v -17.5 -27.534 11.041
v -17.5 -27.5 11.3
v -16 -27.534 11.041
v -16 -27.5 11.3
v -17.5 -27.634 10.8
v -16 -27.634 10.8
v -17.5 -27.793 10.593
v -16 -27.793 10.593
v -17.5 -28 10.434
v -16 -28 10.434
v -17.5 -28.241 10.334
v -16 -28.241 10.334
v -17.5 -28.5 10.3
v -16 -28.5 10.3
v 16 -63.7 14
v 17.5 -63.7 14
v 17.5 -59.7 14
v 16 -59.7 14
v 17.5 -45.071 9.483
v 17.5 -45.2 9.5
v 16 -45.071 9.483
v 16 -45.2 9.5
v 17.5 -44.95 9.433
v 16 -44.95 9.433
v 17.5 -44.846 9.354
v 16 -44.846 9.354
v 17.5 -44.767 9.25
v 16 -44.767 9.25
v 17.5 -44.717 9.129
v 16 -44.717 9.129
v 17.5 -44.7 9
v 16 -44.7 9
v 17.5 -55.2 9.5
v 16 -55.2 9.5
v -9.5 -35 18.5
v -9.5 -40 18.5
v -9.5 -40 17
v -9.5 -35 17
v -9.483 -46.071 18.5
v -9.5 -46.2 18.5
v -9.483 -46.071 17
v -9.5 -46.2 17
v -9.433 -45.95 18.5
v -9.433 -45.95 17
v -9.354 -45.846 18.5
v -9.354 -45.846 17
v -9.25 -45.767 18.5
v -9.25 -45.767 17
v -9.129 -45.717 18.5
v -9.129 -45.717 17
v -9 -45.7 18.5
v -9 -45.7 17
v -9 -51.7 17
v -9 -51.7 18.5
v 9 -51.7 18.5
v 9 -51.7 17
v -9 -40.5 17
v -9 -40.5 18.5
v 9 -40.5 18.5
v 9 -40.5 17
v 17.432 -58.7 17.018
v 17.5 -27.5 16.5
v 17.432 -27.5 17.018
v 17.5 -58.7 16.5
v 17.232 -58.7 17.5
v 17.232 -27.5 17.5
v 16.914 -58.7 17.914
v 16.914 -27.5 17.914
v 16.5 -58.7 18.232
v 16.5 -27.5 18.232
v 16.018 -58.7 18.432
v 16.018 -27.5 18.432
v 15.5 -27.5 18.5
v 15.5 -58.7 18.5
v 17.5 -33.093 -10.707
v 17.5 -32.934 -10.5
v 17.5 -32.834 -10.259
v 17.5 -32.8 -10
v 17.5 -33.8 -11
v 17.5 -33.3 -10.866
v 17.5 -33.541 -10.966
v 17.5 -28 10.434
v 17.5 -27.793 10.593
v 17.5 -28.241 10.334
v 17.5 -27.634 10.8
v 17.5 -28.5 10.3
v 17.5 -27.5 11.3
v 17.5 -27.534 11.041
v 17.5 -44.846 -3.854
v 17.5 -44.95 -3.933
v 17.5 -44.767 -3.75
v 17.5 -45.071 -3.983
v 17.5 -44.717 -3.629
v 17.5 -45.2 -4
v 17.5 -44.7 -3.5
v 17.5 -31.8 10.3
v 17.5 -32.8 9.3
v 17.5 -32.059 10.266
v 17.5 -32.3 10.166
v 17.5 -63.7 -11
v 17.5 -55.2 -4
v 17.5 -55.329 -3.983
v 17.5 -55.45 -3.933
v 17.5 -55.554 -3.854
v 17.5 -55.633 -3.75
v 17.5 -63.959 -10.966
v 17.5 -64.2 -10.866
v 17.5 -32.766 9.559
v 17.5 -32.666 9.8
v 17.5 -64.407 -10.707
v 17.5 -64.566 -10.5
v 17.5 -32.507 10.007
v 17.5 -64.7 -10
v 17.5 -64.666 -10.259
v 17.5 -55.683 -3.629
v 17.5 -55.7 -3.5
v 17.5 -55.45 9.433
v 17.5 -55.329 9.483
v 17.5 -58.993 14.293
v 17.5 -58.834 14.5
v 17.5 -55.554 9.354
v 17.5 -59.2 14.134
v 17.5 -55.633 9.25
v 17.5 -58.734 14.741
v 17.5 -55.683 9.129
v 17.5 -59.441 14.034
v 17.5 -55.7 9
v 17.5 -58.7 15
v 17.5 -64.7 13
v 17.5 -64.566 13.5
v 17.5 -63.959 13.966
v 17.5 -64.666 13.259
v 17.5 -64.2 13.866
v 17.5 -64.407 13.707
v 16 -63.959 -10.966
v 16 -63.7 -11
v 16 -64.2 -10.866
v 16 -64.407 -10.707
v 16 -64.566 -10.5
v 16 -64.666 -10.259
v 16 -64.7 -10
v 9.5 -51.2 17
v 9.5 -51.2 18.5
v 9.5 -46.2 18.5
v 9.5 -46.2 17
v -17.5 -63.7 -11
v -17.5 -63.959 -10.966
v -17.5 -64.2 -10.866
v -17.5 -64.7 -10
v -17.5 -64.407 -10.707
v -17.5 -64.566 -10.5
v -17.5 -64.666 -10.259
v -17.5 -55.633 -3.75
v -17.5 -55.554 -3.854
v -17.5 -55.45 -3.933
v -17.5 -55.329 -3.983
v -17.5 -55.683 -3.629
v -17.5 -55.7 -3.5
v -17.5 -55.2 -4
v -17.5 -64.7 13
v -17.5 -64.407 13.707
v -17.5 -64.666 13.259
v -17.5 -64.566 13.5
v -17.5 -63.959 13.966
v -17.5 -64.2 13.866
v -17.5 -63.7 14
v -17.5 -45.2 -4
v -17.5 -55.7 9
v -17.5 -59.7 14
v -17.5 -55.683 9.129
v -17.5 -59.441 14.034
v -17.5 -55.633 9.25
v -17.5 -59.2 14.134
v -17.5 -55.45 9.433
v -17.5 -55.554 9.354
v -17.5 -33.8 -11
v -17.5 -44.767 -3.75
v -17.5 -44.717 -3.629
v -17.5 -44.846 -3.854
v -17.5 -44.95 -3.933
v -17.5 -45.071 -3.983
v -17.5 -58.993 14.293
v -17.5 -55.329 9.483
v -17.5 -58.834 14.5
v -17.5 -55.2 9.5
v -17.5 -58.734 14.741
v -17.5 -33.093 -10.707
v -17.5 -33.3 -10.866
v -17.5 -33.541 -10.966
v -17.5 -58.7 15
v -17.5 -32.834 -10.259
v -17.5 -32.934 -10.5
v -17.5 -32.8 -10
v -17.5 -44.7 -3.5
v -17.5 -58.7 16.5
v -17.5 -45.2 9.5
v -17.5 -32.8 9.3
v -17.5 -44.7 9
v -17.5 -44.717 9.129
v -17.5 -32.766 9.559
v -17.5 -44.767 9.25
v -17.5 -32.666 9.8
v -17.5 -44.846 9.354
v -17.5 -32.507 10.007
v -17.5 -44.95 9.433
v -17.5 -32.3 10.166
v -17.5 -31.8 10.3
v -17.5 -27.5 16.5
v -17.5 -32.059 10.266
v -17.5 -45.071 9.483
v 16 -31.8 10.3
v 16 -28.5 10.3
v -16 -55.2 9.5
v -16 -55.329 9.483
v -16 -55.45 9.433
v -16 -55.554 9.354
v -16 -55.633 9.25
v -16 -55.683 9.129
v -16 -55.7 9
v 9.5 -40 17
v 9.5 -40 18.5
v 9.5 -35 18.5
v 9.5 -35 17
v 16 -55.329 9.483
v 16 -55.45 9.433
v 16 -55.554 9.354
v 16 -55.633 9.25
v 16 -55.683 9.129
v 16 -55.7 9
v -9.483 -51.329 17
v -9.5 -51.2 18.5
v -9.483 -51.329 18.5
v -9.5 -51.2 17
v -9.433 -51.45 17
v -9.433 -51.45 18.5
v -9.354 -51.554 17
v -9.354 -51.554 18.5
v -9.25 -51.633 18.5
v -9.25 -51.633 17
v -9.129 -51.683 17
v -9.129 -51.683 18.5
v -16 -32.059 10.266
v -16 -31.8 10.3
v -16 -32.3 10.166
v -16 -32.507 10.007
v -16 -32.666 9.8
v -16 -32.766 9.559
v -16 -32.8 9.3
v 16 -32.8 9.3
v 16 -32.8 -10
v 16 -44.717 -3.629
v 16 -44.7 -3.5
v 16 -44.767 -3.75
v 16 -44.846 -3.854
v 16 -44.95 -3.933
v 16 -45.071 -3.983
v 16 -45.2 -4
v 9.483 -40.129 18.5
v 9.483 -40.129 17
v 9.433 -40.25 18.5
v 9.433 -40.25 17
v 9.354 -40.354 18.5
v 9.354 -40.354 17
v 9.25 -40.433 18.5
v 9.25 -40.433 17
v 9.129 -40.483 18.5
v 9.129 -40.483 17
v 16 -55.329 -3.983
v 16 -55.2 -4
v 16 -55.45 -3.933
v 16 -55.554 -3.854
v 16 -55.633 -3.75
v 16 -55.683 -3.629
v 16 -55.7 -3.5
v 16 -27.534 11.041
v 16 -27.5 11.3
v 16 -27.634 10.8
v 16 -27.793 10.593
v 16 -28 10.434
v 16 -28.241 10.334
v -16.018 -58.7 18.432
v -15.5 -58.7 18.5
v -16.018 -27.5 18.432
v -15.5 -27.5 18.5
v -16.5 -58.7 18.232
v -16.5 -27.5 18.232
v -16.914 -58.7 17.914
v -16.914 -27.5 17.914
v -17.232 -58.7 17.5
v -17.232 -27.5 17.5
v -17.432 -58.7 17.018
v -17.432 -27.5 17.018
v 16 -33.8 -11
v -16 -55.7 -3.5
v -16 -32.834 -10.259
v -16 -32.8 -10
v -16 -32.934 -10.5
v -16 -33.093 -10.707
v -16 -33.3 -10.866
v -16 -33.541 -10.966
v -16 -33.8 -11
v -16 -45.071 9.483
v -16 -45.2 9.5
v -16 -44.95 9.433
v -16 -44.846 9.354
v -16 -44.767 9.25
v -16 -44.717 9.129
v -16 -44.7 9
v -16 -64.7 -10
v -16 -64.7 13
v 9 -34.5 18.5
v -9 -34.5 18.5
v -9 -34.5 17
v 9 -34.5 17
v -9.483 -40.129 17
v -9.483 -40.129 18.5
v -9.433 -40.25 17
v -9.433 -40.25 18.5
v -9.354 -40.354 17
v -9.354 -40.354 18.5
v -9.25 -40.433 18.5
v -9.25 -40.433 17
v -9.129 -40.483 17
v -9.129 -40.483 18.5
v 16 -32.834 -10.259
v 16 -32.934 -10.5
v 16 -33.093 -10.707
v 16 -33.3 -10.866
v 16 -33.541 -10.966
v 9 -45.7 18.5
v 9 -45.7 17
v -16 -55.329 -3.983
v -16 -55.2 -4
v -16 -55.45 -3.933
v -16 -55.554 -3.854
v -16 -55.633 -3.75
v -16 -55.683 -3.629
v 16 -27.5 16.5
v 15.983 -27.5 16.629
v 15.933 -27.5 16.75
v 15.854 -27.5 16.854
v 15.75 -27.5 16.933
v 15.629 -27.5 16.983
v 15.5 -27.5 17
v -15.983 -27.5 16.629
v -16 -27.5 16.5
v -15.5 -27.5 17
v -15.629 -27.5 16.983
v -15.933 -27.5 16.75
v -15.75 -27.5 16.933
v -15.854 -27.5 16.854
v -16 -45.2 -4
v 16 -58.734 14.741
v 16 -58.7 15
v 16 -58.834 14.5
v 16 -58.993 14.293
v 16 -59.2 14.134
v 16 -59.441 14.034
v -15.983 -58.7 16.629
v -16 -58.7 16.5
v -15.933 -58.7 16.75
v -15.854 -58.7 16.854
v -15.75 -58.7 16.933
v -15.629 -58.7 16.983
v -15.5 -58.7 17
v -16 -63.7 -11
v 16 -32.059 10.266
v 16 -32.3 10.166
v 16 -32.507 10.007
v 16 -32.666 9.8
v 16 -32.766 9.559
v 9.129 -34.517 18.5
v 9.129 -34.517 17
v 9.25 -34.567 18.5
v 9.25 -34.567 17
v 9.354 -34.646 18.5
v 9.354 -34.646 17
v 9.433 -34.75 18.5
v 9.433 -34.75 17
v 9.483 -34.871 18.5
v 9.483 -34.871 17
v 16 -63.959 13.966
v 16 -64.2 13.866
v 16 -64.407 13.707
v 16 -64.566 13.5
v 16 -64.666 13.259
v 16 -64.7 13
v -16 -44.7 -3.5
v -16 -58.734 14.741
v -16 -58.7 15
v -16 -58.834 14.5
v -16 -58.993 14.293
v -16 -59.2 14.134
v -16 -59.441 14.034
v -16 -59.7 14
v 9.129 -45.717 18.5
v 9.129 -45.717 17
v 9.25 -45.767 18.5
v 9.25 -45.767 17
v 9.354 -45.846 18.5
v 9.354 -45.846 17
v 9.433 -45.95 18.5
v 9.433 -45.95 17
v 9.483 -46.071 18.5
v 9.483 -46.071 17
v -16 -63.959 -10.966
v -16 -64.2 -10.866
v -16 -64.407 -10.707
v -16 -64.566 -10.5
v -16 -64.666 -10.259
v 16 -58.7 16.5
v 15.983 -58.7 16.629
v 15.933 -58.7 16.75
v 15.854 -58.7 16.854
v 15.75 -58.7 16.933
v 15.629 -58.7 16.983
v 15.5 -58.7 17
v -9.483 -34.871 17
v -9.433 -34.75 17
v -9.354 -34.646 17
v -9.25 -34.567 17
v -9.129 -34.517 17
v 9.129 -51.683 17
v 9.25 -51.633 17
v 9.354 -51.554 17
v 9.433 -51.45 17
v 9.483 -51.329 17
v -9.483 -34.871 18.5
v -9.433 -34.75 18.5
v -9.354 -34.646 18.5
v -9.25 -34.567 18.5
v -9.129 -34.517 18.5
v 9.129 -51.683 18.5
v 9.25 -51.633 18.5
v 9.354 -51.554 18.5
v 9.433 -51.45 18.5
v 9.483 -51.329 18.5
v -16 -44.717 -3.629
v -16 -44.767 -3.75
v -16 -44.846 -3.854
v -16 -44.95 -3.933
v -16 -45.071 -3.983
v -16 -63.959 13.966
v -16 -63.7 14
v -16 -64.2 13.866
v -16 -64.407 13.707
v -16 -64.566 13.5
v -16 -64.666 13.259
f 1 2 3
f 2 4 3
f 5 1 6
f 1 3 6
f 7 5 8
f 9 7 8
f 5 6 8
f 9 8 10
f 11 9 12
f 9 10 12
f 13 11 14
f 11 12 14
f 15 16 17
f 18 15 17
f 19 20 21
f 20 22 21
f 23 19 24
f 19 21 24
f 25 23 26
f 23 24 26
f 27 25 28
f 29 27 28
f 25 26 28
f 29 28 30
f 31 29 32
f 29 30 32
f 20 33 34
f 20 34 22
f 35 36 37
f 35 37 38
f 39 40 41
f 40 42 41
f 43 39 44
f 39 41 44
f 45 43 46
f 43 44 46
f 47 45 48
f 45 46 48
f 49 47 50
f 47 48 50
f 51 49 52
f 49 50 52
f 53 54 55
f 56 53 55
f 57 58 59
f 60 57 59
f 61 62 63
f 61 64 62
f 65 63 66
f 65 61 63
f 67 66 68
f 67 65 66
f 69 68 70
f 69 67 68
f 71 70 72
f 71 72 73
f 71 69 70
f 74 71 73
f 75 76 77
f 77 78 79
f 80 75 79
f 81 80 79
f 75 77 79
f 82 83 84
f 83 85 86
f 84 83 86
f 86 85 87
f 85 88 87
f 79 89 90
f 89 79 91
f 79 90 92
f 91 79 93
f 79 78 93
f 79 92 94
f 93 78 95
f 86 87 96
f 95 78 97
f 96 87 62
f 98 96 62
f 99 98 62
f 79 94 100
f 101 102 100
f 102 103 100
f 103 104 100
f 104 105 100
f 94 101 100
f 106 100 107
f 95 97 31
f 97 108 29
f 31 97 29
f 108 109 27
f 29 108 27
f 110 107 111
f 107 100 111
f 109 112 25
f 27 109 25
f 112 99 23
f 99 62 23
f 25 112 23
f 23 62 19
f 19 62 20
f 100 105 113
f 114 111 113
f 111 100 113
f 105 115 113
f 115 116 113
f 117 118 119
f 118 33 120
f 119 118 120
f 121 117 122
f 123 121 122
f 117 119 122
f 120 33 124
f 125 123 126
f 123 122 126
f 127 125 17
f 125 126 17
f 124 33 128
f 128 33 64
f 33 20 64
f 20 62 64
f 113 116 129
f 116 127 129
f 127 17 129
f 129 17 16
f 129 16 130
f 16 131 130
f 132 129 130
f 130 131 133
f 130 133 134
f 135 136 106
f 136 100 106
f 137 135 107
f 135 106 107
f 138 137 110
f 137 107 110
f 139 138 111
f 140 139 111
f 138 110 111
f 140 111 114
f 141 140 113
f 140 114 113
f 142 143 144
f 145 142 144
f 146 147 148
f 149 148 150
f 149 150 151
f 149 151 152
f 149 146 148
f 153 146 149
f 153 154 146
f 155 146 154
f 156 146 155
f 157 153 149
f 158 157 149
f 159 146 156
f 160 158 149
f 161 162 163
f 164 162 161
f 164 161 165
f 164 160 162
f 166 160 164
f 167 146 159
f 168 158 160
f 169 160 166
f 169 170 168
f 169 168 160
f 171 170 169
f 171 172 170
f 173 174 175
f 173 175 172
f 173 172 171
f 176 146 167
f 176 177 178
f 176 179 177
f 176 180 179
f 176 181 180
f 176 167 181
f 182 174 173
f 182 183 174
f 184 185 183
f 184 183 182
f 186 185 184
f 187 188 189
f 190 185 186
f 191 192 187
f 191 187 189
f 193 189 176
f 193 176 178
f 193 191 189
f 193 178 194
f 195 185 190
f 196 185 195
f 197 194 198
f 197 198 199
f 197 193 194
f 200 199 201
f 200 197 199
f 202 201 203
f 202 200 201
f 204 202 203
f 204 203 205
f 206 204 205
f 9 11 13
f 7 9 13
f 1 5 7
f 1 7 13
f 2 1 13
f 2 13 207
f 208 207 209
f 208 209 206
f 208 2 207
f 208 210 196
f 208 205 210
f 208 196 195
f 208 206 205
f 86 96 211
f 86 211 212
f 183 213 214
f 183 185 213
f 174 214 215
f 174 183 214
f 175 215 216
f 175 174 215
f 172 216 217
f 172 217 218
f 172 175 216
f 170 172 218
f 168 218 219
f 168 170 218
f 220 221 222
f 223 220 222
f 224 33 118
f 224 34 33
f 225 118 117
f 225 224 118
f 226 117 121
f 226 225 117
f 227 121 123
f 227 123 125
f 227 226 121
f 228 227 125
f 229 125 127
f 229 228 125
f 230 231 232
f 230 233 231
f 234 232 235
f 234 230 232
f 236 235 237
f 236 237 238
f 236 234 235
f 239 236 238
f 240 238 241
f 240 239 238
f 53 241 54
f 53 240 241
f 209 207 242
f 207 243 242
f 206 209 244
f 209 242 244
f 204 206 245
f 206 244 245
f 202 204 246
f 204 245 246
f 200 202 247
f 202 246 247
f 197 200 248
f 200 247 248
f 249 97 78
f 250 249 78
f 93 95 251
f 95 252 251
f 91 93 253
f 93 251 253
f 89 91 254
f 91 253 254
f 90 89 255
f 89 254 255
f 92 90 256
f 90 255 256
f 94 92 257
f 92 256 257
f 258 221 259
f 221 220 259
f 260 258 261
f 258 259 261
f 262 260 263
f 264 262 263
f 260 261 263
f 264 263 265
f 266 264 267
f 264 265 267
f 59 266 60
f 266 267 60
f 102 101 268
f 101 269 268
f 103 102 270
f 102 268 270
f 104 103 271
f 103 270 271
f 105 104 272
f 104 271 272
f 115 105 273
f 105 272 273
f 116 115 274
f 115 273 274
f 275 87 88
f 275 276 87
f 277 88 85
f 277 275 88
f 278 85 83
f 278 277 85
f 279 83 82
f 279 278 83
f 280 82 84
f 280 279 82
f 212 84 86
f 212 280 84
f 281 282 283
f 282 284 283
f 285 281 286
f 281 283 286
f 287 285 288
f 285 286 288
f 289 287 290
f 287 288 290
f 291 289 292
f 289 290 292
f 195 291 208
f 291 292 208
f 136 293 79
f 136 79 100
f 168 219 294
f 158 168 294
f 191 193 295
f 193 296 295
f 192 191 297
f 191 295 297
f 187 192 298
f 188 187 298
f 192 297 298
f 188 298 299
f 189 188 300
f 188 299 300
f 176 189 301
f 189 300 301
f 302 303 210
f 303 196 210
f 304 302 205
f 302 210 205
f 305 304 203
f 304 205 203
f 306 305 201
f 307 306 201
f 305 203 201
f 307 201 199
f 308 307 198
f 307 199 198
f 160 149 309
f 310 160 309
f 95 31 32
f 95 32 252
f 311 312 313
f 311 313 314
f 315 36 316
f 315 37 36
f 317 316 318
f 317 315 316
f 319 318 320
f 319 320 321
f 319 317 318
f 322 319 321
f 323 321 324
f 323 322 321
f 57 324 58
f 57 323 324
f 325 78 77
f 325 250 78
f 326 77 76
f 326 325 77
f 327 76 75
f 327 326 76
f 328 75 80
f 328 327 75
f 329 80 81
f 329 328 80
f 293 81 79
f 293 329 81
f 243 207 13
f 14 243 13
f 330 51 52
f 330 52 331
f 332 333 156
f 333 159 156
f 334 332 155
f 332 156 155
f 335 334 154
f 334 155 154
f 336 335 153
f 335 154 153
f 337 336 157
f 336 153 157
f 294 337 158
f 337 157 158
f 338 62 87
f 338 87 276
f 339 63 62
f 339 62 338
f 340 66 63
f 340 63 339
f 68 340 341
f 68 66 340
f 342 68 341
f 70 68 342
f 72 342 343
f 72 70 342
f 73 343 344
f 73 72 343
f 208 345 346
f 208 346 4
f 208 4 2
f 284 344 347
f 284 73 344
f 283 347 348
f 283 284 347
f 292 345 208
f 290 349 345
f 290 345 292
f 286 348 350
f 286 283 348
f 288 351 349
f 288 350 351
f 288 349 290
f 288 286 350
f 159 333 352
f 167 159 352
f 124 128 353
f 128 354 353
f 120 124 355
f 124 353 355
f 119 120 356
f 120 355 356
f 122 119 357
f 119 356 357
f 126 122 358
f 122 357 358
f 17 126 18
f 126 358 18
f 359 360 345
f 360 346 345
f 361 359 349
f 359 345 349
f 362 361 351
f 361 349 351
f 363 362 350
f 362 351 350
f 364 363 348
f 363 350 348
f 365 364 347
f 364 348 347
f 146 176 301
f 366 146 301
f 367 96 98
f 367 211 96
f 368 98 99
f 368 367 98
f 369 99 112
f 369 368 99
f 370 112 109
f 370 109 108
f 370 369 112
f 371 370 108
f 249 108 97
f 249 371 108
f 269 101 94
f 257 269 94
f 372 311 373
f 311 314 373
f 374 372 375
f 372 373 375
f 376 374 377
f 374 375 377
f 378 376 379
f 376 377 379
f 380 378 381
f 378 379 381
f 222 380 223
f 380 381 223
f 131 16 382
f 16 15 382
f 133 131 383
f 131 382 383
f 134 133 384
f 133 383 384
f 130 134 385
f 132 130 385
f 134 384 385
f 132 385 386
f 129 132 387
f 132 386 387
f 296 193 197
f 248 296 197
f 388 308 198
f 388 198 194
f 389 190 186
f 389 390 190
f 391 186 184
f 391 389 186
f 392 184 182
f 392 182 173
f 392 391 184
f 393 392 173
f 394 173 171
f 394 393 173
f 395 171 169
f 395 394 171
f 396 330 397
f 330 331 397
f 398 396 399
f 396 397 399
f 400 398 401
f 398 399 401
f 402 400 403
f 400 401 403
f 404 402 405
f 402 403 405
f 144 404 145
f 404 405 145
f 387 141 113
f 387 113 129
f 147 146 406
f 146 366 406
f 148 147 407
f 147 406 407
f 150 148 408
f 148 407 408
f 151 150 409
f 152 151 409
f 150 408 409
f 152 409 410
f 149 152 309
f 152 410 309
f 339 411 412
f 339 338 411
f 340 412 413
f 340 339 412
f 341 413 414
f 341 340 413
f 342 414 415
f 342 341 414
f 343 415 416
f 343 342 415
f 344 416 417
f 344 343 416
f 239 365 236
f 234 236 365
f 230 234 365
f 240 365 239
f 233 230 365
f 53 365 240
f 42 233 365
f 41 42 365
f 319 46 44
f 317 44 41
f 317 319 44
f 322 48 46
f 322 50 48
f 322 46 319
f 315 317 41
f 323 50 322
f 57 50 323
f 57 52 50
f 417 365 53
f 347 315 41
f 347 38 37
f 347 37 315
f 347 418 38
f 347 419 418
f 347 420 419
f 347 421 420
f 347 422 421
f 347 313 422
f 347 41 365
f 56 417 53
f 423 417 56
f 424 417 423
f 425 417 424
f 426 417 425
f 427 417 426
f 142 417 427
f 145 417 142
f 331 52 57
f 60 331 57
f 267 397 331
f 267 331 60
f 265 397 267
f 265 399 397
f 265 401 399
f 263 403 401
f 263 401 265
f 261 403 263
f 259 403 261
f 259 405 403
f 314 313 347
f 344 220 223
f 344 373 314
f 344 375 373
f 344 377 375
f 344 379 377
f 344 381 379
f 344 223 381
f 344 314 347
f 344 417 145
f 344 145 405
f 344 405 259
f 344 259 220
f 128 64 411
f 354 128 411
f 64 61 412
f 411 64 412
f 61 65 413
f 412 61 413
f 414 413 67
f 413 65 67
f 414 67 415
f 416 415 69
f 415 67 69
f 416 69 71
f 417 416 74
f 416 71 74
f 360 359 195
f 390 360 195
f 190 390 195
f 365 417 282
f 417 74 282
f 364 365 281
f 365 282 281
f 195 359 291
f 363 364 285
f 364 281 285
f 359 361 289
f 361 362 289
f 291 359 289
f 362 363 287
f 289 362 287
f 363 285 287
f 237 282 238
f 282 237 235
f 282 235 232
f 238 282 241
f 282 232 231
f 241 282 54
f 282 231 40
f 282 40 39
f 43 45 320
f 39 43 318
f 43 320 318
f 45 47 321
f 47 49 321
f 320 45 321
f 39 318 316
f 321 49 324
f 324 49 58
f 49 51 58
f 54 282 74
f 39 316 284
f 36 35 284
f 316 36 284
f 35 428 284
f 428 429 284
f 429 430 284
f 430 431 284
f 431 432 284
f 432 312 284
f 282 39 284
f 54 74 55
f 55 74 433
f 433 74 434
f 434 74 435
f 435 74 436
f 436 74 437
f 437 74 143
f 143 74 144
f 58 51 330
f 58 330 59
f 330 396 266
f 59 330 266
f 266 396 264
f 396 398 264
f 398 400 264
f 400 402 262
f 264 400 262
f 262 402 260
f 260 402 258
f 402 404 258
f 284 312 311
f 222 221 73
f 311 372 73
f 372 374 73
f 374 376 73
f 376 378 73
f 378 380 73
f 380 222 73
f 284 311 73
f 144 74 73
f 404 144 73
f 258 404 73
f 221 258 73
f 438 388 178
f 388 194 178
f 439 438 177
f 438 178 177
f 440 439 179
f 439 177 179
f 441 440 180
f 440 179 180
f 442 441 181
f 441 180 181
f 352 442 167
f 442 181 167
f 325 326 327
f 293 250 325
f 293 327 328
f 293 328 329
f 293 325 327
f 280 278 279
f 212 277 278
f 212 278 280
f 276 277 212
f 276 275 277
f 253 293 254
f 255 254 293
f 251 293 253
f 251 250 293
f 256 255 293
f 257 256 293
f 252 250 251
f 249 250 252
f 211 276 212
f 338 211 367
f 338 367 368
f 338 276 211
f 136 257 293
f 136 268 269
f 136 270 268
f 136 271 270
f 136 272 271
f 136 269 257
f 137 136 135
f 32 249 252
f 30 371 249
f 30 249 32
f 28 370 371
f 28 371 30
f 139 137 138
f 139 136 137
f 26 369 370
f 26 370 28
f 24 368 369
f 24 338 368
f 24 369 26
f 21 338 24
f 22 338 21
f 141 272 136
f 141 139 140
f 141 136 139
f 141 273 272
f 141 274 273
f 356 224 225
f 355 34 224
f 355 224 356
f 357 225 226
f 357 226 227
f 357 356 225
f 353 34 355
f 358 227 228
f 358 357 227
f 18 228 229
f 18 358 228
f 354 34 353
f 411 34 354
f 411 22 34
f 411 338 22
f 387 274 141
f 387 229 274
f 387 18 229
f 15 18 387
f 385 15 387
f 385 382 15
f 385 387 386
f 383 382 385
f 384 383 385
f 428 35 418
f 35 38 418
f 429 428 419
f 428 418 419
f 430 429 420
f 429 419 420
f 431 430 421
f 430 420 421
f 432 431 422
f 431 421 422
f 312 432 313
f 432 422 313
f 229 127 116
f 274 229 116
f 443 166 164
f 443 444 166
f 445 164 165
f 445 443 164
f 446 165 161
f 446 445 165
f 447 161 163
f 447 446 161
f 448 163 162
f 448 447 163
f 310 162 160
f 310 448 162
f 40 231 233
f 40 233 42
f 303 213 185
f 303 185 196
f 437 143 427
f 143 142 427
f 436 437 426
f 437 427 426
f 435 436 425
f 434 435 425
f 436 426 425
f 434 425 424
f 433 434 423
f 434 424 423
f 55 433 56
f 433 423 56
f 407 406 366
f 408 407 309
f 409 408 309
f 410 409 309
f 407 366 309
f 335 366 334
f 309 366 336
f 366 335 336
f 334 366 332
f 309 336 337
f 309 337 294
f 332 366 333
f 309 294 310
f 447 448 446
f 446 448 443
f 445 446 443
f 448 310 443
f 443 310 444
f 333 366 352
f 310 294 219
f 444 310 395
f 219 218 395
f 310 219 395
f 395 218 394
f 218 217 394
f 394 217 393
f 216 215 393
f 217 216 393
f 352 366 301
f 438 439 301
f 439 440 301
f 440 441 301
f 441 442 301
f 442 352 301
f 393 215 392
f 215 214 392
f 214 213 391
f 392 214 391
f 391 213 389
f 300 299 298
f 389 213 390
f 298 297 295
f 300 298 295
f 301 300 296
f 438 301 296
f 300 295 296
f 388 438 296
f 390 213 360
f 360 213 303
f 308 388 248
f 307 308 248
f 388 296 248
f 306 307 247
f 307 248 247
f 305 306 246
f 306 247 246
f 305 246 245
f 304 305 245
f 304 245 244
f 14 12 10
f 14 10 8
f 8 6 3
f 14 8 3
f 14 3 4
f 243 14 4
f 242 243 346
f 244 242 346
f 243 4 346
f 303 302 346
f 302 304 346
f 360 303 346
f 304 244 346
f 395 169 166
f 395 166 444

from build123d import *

# Parameters (mm, degrees)
SKETCH1_W           = 37.2
SKETCH1_H           = 29.5
BOSS_EXTRUDE1_DEPTH = 1.5
SKETCH2_W           = 4.5
SKETCH2_H           = 6
CUT_EXTRUDE1_DEPTH  = 2.5
SKETCH3_W           = 1.5
SKETCH3_H           = 31.2
BOSS_EXTRUDE2_DEPTH = 33.5
SKETCH4_W           = 1.5
SKETCH4_H           = 31.2
BOSS_EXTRUDE3_DEPTH = 28
SKETCH5_W           = 1.5
SKETCH5_H           = 25
BOSS_EXTRUDE4_DEPTH = 6
CUT_EXTRUDE2_REACH  = 37
SKETCH6_W           = 21.3
SKETCH6_H           = 5.3
SKETCH7_W           = 21.3
SKETCH7_H           = 5.3
CUT_EXTRUDE3_DEPTH  = 36
FILLET1_R           = 0.5
FILLET2_R           = 2
SKETCH8_W           = 19
SKETCH8_H           = 6
CUT_EXTRUDE4_DEPTH  = 1.5
FILLET3_R           = 0.5
SKETCH9_W           = 13.5
SKETCH9_H           = 11
CUT_EXTRUDE5_DEPTH  = 35
FILLET4_R           = 0.5
FILLET5_R           = 1


with BuildPart() as part:
    # Sketch1 → Boss-Extrude1 (new body)
    with BuildSketch(Plane(origin=(16, 0, 0), x_dir=(0, -1, 0), z_dir=(-1, 0, 0))):
        with Locations((46.1, 3.75)):
            Rectangle(SKETCH1_W, SKETCH1_H)
    extrude(amount=-BOSS_EXTRUDE1_DEPTH)

    # Sketch2 → Cut-Extrude1 (cut, through all)
    with BuildSketch(Plane(origin=(17.5, 0, 0), x_dir=(0, 0, -1), z_dir=(1, 0, 0))):
        with Locations((-16.25, -61.7)):
            Rectangle(SKETCH2_W, SKETCH2_H)
    extrude(amount=-CUT_EXTRUDE1_DEPTH, mode=Mode.SUBTRACT)

    # Sketch3 → Boss-Extrude2 (add)
    with BuildSketch(Plane.ZY.offset(-16)):
        with Locations((17.75, -43.1)):
            Rectangle(SKETCH3_W, SKETCH3_H)
    extrude(amount=BOSS_EXTRUDE2_DEPTH)

    # Sketch4 → Boss-Extrude3 (add)
    with BuildSketch(Plane(origin=(0, 0, 17), x_dir=(-1, 0, 0), z_dir=(0, 0, -1))):
        with Locations((16.75, -43.1)):
            Rectangle(SKETCH4_W, SKETCH4_H)
    extrude(amount=BOSS_EXTRUDE3_DEPTH)

    # Sketch5 → Boss-Extrude4 (add)
    with BuildSketch(Plane.XZ.offset(58.7)):
        with Locations((-16.75, 1.5)):
            Rectangle(SKETCH5_W, SKETCH5_H)
    extrude(amount=BOSS_EXTRUDE4_DEPTH)

    # Sketch6 → Cut-Extrude2 (cut, up to next)
    with BuildSketch(Plane(origin=(17.5, 0, 0), x_dir=(0, 0, -1), z_dir=(1, 0, 0)), mode=Mode.PRIVATE) as cut_extrude2_sk1:
        with Locations((0.35, -30.15)):
            Rectangle(SKETCH6_W, SKETCH6_H)
    cut_extrude2_tool1 = extrude(cut_extrude2_sk1.sketch, amount=-CUT_EXTRUDE2_REACH, mode=Mode.PRIVATE) & part.part
    add(cut_extrude2_tool1.solids().sort_by_distance((17.5, -30.15, -0.35))[0], mode=Mode.SUBTRACT)

    # Sketch7 → Cut-Extrude3 (cut, through all)
    with BuildSketch(Plane.ZY.offset(17.5)):
        with Locations((-0.35, -30.15)):
            Rectangle(SKETCH7_W, SKETCH7_H)
    extrude(amount=-CUT_EXTRUDE3_DEPTH, mode=Mode.SUBTRACT)

    # Fillet1
    fillet1_edges = [part.edges().sort_by_distance(p)[0] for p in [
        (16, -43.1, 17),
        (-16, -43.1, 17),
    ]]
    fillet(fillet1_edges, radius=FILLET1_R)

    # Fillet2
    fillet2_edges = [part.edges().sort_by_distance(p)[0] for p in [
        (17.5, -43.1, 18.5),
        (-17.5, -43.1, 18.5),
    ]]
    fillet(fillet2_edges, radius=FILLET2_R)

    # Sketch8 → Cut-Extrude4 (cut)
    with BuildSketch(Plane.XY.offset(18.5)):
        with Locations((0, -37.5)):
            Rectangle(SKETCH8_W, SKETCH8_H)
        with Locations((0, -48.7)):
            Rectangle(SKETCH8_W, SKETCH8_H)
    extrude(amount=-CUT_EXTRUDE4_DEPTH, mode=Mode.SUBTRACT)

    # Fillet3
    fillet3_edges = [part.edges().sort_by_distance(p)[0] for p in [
        (9.5, -51.7, 17.75),
        (-9.5, -51.7, 17.75),
        (-9.5, -45.7, 17.75),
        (9.5, -45.7, 17.75),
        (-9.5, -40.5, 17.75),
        (-9.5, -34.5, 17.75),
        (9.5, -34.5, 17.75),
        (9.5, -40.5, 17.75),
    ]]
    fillet(fillet3_edges, radius=FILLET3_R)

    # Sketch9 → Cut-Extrude5 (cut)
    with BuildSketch(Plane(origin=(17.5, 0, 0), x_dir=(0, 0, -1), z_dir=(1, 0, 0))):
        with Locations((-2.75, -50.2)):
            Rectangle(SKETCH9_W, SKETCH9_H)
    extrude(amount=-CUT_EXTRUDE5_DEPTH, mode=Mode.SUBTRACT)

    # Fillet4
    fillet4_edges = [part.edges().sort_by_distance(p)[0] for p in [
        (-16.75, -55.7, 9.5),
        (-16.75, -44.7, 9.5),
        (-16.75, -44.7, -4),
        (-16.75, -55.7, -4),
        (16.75, -55.7, 9.5),
        (16.75, -44.7, 9.5),
        (16.75, -44.7, -4),
        (16.75, -55.7, -4),
    ]]
    fillet(fillet4_edges, radius=FILLET4_R)

    # Fillet5
    fillet5_edges = [part.edges().sort_by_distance(p)[0] for p in [
        (16.75, -58.7, 14),
        (16.75, -64.7, 14),
        (-16.75, -58.7, 14),
        (-16.75, -64.7, -11),
        (-16.75, -64.7, 14),
        (16.75, -32.8, -11),
        (16.75, -32.8, 10.3),
        (16.75, -27.5, 10.3),
        (16.75, -64.7, -11),
        (-16.75, -27.5, 10.3),
        (-16.75, -32.8, -11),
        (-16.75, -32.8, 10.3),
    ]]
    fillet(fillet5_edges, radius=FILLET5_R)


solid = part.part
